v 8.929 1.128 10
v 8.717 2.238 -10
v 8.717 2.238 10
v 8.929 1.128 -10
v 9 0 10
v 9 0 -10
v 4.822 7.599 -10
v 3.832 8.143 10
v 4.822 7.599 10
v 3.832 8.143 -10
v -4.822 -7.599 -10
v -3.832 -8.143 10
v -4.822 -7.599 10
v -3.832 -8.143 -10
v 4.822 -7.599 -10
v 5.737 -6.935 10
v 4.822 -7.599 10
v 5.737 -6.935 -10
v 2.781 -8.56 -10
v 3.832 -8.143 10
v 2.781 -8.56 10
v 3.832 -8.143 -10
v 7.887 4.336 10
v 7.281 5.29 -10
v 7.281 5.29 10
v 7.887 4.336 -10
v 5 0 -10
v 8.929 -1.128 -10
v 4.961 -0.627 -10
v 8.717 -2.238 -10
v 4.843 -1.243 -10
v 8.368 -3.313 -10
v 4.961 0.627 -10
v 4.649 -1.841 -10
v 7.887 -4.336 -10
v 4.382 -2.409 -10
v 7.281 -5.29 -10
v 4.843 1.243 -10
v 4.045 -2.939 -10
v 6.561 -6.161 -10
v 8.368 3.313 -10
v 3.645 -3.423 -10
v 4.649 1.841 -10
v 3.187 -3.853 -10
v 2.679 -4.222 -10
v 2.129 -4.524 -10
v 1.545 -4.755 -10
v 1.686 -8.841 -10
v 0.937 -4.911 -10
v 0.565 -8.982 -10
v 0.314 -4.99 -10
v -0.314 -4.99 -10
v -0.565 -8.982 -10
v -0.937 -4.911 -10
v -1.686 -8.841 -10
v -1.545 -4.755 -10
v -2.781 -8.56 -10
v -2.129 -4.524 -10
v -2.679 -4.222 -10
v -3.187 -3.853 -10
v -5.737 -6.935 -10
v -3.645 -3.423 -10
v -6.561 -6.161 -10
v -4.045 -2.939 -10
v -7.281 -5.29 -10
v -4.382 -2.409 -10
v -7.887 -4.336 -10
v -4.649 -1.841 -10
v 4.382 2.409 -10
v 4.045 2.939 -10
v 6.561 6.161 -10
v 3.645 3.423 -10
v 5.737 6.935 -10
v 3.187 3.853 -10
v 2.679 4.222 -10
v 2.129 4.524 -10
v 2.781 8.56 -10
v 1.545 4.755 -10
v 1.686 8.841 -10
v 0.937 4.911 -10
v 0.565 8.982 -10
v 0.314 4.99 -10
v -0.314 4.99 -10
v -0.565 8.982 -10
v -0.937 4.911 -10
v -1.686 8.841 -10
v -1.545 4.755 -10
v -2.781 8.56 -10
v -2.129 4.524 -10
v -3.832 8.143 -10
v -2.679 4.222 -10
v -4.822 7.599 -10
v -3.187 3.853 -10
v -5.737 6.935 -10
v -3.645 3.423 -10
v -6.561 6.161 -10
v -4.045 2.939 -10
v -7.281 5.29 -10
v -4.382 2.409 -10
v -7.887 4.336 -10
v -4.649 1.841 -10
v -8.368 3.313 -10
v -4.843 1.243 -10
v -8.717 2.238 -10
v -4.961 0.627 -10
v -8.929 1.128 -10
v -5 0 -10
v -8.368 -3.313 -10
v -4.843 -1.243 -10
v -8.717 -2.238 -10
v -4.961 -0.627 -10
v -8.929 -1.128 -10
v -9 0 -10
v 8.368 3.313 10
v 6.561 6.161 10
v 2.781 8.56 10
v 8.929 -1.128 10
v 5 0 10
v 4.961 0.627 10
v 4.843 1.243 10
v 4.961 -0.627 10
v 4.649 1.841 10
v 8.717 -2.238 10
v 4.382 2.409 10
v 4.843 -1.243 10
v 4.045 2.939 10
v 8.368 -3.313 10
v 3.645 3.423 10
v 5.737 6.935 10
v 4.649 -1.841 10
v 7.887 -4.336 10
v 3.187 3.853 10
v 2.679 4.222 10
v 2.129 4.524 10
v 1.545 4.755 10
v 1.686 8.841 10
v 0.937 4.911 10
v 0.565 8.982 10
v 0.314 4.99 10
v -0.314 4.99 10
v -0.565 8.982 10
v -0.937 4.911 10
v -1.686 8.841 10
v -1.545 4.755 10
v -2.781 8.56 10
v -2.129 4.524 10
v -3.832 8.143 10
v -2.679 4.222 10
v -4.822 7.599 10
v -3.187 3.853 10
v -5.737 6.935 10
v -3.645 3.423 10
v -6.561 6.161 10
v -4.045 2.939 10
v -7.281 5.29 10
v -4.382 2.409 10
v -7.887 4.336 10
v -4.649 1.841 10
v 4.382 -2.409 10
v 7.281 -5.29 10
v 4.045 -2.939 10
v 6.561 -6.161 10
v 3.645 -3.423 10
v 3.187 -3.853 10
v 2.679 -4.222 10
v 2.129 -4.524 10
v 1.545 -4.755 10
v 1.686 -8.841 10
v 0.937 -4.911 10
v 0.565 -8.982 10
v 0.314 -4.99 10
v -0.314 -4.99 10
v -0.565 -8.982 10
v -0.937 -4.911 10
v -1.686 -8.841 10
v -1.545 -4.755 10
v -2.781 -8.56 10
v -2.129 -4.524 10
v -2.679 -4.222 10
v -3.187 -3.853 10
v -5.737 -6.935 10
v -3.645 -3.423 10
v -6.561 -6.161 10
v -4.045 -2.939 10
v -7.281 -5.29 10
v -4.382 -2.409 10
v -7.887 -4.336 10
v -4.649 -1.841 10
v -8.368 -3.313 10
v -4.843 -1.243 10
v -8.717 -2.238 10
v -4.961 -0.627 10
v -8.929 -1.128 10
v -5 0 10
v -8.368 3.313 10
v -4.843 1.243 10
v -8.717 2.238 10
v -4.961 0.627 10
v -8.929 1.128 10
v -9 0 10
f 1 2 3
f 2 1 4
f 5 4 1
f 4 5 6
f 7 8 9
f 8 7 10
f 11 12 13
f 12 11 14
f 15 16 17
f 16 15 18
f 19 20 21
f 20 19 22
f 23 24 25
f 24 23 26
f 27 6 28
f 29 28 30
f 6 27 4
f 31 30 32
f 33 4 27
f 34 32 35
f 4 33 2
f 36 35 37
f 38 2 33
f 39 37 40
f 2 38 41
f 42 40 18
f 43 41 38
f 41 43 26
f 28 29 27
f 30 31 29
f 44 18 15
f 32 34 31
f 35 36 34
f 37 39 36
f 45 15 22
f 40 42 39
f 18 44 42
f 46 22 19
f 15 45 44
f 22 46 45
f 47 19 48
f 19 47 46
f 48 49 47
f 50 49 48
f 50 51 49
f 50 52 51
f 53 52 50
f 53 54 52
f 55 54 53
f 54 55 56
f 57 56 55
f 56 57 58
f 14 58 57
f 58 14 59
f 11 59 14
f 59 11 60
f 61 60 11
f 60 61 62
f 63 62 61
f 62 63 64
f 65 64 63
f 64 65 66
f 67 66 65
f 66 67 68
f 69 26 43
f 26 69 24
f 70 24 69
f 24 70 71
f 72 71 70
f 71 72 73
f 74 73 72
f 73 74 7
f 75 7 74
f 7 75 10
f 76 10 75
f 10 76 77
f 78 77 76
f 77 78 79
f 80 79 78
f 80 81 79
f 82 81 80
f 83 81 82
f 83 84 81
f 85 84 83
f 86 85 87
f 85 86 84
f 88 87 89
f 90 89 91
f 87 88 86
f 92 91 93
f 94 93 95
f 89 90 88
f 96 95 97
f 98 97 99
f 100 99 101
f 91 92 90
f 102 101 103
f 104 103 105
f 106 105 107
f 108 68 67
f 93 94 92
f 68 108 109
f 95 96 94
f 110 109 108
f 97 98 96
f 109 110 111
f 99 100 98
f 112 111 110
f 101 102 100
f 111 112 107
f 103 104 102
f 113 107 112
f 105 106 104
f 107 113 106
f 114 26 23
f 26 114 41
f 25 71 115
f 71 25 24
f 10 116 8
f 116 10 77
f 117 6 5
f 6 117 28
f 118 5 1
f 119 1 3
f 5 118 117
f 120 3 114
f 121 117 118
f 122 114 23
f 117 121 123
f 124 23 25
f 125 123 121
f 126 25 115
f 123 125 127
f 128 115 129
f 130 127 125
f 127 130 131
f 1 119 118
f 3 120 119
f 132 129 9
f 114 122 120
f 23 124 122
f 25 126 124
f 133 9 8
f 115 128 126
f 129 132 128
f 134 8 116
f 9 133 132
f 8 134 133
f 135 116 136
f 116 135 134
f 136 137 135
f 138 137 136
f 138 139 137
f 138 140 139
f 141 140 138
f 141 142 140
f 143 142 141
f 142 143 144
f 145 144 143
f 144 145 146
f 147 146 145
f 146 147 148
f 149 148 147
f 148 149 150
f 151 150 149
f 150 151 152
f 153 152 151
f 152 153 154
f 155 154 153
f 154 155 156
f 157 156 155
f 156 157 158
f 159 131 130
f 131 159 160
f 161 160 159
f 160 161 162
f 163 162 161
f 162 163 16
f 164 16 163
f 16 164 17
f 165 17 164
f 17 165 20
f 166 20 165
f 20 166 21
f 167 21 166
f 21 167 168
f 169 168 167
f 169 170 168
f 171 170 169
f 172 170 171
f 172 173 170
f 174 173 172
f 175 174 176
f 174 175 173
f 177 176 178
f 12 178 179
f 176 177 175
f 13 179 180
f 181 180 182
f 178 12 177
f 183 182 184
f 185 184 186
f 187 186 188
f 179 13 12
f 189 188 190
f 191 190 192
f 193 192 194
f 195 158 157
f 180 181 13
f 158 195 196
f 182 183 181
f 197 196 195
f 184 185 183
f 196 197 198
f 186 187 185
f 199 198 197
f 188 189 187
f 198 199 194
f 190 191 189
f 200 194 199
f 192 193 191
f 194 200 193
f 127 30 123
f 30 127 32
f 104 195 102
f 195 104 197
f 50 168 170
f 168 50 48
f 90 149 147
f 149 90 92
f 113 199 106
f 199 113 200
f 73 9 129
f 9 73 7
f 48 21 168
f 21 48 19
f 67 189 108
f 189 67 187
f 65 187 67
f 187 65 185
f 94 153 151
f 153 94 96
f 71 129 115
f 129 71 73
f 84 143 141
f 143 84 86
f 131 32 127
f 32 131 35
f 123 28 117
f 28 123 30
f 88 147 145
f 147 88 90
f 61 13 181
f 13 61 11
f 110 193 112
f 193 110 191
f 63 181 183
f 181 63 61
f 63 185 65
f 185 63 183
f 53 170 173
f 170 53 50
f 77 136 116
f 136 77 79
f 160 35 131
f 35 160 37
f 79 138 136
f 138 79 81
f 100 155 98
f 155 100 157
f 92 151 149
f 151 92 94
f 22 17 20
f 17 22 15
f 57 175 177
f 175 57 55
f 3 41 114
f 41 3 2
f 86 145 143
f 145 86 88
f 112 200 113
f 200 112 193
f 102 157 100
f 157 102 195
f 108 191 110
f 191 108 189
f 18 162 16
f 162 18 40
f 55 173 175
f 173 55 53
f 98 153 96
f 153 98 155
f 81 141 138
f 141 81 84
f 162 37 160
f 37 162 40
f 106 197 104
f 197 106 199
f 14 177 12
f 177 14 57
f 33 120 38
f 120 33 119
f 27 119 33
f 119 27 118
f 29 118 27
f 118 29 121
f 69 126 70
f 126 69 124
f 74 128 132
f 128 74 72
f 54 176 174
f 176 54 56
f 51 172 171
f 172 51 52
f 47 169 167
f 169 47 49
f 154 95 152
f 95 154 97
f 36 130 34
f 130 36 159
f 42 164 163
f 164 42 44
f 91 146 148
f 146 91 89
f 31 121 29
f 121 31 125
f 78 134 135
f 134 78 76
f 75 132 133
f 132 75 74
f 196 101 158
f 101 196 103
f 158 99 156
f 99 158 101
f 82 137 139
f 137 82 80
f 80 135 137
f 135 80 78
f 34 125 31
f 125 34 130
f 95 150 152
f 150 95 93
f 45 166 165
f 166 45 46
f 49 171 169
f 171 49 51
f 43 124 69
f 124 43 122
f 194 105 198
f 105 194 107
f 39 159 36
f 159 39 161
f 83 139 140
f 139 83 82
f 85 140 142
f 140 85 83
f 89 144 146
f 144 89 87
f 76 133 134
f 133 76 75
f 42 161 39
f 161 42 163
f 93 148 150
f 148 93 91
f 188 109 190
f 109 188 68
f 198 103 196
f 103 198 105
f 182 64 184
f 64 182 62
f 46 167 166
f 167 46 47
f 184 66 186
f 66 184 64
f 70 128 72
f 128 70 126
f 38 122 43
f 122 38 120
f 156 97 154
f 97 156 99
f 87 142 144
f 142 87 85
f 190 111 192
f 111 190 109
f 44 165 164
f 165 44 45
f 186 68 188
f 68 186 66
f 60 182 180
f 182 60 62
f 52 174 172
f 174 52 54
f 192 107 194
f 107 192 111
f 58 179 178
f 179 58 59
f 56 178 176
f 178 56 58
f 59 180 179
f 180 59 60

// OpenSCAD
$fn = 50;


difference() {
	union() {
		translate(v = [0, 0, -10.0000000000]) {
			cylinder(h = 20, r = 9.0000000000);
		}
	}
	union() {
		translate(v = [0, 0, -100.0000000000]) {
			cylinder(h = 200, r = 5.0000000000);
		}
	}
}
